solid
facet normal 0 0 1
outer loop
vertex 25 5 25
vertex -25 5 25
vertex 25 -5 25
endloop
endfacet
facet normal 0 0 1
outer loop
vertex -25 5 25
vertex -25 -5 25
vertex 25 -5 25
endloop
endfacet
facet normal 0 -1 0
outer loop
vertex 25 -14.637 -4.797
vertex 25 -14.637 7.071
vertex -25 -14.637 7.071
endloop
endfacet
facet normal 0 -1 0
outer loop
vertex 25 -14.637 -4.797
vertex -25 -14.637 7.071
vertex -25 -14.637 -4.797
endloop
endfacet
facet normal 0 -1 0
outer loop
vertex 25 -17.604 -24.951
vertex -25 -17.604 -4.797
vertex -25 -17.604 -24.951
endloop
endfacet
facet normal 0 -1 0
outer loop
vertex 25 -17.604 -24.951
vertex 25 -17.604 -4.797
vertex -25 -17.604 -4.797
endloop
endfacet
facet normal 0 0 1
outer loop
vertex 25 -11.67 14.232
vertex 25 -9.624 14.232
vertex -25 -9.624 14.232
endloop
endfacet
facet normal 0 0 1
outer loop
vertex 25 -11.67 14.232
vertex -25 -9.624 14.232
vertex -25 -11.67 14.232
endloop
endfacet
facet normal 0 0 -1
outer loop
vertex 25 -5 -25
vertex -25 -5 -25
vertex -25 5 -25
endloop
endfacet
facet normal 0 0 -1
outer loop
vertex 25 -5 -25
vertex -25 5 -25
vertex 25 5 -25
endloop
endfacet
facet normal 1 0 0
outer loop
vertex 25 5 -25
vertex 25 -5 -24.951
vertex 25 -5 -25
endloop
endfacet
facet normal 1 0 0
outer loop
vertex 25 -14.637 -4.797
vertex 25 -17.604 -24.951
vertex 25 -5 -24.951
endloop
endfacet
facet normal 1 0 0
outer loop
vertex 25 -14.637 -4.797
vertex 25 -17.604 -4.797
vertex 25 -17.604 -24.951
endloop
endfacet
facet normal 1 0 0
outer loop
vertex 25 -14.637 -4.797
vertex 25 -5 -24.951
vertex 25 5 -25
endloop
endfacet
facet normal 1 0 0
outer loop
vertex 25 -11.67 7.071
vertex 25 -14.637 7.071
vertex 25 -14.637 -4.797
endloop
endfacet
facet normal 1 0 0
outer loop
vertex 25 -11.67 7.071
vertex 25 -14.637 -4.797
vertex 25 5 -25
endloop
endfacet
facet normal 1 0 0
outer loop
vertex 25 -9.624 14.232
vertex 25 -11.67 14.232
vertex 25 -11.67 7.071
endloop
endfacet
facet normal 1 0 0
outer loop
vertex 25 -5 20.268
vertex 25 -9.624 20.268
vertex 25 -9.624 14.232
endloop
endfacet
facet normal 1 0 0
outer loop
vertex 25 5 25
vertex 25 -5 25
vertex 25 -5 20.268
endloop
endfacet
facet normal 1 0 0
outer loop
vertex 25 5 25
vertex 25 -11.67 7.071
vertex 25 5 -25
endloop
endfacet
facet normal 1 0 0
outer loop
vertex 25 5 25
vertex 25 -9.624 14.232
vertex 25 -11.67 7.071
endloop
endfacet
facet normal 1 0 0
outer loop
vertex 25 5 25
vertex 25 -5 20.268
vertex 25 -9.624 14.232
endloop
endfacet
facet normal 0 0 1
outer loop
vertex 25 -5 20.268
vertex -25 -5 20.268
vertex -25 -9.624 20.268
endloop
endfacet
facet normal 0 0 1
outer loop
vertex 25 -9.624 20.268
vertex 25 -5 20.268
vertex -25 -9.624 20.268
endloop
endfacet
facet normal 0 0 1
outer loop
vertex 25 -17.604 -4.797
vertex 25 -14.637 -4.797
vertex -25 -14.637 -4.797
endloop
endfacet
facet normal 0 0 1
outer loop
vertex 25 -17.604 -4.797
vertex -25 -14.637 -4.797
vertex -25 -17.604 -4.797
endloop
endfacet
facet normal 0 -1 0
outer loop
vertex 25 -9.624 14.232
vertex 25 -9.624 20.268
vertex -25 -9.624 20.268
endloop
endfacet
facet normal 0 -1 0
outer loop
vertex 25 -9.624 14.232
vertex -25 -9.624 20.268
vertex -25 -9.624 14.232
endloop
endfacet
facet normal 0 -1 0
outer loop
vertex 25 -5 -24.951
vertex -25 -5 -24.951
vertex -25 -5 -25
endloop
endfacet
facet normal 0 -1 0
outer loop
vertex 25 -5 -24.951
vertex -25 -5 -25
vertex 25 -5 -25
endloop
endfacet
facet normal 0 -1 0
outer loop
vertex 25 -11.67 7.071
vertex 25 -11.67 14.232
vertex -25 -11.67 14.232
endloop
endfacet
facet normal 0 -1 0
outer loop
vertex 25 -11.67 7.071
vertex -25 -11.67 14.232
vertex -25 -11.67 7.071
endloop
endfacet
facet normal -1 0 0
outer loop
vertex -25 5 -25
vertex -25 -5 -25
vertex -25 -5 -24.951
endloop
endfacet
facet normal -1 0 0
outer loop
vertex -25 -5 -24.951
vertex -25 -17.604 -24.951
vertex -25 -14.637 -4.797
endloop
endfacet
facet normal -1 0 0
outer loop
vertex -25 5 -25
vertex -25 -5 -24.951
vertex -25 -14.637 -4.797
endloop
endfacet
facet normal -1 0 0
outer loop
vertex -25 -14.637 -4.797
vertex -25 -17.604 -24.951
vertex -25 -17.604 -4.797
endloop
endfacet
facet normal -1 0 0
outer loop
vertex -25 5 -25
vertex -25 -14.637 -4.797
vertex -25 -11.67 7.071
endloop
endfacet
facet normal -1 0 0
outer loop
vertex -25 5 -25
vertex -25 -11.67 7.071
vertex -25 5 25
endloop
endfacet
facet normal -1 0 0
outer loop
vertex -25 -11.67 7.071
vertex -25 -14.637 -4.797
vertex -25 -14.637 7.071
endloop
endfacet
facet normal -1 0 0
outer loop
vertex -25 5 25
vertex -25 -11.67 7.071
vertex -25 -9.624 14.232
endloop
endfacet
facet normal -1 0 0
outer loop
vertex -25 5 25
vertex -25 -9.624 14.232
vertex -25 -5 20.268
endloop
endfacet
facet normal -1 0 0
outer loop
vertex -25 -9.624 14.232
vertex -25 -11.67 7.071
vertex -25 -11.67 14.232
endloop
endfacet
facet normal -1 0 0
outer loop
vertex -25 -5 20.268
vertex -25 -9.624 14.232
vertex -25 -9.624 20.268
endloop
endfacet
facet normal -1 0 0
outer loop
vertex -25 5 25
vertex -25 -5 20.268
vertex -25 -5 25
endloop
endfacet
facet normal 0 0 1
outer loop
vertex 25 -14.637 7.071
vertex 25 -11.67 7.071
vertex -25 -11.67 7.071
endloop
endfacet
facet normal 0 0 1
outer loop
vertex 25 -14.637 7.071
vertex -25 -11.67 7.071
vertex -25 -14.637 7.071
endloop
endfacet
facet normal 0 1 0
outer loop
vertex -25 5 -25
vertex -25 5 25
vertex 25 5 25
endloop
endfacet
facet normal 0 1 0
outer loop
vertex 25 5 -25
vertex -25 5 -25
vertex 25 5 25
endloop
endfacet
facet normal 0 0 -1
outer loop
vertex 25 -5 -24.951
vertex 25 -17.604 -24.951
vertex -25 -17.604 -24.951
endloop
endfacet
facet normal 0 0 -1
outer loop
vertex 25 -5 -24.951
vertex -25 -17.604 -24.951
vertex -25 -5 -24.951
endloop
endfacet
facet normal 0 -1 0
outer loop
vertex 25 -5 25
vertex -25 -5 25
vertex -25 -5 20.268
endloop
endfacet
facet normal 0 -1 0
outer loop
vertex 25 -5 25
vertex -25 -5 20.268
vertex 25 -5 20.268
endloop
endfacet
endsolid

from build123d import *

# Parameters (mm, degrees)
F0_W     = 50
F0_H     = 50
F1_DEPTH = 5
F3_DEPTH = 25


with BuildPart() as f1:
    # F0 (on Front) → F1 (new body, symmetric)
    with BuildSketch(Plane.XZ):
        Rectangle(F0_W, F0_H)
    extrude(amount=F1_DEPTH, both=True)

    # F2 (on Right) → F3 (join, symmetric)
    with BuildSketch(Plane.YZ):
        Polygon((-4.812052, -24.951309), (-4.812052, 20.26826), (-9.624103, 20.26826), (-9.624103, 14.232163), (-11.670237, 14.232163), (-11.670237, 7.070693), (-14.637132, 7.070693), (-14.637132, -4.796886), (-17.604027, -4.796886), (-17.604027, -24.951309), align=None)
    extrude(amount=F3_DEPTH, both=True)


solid = f1.part
